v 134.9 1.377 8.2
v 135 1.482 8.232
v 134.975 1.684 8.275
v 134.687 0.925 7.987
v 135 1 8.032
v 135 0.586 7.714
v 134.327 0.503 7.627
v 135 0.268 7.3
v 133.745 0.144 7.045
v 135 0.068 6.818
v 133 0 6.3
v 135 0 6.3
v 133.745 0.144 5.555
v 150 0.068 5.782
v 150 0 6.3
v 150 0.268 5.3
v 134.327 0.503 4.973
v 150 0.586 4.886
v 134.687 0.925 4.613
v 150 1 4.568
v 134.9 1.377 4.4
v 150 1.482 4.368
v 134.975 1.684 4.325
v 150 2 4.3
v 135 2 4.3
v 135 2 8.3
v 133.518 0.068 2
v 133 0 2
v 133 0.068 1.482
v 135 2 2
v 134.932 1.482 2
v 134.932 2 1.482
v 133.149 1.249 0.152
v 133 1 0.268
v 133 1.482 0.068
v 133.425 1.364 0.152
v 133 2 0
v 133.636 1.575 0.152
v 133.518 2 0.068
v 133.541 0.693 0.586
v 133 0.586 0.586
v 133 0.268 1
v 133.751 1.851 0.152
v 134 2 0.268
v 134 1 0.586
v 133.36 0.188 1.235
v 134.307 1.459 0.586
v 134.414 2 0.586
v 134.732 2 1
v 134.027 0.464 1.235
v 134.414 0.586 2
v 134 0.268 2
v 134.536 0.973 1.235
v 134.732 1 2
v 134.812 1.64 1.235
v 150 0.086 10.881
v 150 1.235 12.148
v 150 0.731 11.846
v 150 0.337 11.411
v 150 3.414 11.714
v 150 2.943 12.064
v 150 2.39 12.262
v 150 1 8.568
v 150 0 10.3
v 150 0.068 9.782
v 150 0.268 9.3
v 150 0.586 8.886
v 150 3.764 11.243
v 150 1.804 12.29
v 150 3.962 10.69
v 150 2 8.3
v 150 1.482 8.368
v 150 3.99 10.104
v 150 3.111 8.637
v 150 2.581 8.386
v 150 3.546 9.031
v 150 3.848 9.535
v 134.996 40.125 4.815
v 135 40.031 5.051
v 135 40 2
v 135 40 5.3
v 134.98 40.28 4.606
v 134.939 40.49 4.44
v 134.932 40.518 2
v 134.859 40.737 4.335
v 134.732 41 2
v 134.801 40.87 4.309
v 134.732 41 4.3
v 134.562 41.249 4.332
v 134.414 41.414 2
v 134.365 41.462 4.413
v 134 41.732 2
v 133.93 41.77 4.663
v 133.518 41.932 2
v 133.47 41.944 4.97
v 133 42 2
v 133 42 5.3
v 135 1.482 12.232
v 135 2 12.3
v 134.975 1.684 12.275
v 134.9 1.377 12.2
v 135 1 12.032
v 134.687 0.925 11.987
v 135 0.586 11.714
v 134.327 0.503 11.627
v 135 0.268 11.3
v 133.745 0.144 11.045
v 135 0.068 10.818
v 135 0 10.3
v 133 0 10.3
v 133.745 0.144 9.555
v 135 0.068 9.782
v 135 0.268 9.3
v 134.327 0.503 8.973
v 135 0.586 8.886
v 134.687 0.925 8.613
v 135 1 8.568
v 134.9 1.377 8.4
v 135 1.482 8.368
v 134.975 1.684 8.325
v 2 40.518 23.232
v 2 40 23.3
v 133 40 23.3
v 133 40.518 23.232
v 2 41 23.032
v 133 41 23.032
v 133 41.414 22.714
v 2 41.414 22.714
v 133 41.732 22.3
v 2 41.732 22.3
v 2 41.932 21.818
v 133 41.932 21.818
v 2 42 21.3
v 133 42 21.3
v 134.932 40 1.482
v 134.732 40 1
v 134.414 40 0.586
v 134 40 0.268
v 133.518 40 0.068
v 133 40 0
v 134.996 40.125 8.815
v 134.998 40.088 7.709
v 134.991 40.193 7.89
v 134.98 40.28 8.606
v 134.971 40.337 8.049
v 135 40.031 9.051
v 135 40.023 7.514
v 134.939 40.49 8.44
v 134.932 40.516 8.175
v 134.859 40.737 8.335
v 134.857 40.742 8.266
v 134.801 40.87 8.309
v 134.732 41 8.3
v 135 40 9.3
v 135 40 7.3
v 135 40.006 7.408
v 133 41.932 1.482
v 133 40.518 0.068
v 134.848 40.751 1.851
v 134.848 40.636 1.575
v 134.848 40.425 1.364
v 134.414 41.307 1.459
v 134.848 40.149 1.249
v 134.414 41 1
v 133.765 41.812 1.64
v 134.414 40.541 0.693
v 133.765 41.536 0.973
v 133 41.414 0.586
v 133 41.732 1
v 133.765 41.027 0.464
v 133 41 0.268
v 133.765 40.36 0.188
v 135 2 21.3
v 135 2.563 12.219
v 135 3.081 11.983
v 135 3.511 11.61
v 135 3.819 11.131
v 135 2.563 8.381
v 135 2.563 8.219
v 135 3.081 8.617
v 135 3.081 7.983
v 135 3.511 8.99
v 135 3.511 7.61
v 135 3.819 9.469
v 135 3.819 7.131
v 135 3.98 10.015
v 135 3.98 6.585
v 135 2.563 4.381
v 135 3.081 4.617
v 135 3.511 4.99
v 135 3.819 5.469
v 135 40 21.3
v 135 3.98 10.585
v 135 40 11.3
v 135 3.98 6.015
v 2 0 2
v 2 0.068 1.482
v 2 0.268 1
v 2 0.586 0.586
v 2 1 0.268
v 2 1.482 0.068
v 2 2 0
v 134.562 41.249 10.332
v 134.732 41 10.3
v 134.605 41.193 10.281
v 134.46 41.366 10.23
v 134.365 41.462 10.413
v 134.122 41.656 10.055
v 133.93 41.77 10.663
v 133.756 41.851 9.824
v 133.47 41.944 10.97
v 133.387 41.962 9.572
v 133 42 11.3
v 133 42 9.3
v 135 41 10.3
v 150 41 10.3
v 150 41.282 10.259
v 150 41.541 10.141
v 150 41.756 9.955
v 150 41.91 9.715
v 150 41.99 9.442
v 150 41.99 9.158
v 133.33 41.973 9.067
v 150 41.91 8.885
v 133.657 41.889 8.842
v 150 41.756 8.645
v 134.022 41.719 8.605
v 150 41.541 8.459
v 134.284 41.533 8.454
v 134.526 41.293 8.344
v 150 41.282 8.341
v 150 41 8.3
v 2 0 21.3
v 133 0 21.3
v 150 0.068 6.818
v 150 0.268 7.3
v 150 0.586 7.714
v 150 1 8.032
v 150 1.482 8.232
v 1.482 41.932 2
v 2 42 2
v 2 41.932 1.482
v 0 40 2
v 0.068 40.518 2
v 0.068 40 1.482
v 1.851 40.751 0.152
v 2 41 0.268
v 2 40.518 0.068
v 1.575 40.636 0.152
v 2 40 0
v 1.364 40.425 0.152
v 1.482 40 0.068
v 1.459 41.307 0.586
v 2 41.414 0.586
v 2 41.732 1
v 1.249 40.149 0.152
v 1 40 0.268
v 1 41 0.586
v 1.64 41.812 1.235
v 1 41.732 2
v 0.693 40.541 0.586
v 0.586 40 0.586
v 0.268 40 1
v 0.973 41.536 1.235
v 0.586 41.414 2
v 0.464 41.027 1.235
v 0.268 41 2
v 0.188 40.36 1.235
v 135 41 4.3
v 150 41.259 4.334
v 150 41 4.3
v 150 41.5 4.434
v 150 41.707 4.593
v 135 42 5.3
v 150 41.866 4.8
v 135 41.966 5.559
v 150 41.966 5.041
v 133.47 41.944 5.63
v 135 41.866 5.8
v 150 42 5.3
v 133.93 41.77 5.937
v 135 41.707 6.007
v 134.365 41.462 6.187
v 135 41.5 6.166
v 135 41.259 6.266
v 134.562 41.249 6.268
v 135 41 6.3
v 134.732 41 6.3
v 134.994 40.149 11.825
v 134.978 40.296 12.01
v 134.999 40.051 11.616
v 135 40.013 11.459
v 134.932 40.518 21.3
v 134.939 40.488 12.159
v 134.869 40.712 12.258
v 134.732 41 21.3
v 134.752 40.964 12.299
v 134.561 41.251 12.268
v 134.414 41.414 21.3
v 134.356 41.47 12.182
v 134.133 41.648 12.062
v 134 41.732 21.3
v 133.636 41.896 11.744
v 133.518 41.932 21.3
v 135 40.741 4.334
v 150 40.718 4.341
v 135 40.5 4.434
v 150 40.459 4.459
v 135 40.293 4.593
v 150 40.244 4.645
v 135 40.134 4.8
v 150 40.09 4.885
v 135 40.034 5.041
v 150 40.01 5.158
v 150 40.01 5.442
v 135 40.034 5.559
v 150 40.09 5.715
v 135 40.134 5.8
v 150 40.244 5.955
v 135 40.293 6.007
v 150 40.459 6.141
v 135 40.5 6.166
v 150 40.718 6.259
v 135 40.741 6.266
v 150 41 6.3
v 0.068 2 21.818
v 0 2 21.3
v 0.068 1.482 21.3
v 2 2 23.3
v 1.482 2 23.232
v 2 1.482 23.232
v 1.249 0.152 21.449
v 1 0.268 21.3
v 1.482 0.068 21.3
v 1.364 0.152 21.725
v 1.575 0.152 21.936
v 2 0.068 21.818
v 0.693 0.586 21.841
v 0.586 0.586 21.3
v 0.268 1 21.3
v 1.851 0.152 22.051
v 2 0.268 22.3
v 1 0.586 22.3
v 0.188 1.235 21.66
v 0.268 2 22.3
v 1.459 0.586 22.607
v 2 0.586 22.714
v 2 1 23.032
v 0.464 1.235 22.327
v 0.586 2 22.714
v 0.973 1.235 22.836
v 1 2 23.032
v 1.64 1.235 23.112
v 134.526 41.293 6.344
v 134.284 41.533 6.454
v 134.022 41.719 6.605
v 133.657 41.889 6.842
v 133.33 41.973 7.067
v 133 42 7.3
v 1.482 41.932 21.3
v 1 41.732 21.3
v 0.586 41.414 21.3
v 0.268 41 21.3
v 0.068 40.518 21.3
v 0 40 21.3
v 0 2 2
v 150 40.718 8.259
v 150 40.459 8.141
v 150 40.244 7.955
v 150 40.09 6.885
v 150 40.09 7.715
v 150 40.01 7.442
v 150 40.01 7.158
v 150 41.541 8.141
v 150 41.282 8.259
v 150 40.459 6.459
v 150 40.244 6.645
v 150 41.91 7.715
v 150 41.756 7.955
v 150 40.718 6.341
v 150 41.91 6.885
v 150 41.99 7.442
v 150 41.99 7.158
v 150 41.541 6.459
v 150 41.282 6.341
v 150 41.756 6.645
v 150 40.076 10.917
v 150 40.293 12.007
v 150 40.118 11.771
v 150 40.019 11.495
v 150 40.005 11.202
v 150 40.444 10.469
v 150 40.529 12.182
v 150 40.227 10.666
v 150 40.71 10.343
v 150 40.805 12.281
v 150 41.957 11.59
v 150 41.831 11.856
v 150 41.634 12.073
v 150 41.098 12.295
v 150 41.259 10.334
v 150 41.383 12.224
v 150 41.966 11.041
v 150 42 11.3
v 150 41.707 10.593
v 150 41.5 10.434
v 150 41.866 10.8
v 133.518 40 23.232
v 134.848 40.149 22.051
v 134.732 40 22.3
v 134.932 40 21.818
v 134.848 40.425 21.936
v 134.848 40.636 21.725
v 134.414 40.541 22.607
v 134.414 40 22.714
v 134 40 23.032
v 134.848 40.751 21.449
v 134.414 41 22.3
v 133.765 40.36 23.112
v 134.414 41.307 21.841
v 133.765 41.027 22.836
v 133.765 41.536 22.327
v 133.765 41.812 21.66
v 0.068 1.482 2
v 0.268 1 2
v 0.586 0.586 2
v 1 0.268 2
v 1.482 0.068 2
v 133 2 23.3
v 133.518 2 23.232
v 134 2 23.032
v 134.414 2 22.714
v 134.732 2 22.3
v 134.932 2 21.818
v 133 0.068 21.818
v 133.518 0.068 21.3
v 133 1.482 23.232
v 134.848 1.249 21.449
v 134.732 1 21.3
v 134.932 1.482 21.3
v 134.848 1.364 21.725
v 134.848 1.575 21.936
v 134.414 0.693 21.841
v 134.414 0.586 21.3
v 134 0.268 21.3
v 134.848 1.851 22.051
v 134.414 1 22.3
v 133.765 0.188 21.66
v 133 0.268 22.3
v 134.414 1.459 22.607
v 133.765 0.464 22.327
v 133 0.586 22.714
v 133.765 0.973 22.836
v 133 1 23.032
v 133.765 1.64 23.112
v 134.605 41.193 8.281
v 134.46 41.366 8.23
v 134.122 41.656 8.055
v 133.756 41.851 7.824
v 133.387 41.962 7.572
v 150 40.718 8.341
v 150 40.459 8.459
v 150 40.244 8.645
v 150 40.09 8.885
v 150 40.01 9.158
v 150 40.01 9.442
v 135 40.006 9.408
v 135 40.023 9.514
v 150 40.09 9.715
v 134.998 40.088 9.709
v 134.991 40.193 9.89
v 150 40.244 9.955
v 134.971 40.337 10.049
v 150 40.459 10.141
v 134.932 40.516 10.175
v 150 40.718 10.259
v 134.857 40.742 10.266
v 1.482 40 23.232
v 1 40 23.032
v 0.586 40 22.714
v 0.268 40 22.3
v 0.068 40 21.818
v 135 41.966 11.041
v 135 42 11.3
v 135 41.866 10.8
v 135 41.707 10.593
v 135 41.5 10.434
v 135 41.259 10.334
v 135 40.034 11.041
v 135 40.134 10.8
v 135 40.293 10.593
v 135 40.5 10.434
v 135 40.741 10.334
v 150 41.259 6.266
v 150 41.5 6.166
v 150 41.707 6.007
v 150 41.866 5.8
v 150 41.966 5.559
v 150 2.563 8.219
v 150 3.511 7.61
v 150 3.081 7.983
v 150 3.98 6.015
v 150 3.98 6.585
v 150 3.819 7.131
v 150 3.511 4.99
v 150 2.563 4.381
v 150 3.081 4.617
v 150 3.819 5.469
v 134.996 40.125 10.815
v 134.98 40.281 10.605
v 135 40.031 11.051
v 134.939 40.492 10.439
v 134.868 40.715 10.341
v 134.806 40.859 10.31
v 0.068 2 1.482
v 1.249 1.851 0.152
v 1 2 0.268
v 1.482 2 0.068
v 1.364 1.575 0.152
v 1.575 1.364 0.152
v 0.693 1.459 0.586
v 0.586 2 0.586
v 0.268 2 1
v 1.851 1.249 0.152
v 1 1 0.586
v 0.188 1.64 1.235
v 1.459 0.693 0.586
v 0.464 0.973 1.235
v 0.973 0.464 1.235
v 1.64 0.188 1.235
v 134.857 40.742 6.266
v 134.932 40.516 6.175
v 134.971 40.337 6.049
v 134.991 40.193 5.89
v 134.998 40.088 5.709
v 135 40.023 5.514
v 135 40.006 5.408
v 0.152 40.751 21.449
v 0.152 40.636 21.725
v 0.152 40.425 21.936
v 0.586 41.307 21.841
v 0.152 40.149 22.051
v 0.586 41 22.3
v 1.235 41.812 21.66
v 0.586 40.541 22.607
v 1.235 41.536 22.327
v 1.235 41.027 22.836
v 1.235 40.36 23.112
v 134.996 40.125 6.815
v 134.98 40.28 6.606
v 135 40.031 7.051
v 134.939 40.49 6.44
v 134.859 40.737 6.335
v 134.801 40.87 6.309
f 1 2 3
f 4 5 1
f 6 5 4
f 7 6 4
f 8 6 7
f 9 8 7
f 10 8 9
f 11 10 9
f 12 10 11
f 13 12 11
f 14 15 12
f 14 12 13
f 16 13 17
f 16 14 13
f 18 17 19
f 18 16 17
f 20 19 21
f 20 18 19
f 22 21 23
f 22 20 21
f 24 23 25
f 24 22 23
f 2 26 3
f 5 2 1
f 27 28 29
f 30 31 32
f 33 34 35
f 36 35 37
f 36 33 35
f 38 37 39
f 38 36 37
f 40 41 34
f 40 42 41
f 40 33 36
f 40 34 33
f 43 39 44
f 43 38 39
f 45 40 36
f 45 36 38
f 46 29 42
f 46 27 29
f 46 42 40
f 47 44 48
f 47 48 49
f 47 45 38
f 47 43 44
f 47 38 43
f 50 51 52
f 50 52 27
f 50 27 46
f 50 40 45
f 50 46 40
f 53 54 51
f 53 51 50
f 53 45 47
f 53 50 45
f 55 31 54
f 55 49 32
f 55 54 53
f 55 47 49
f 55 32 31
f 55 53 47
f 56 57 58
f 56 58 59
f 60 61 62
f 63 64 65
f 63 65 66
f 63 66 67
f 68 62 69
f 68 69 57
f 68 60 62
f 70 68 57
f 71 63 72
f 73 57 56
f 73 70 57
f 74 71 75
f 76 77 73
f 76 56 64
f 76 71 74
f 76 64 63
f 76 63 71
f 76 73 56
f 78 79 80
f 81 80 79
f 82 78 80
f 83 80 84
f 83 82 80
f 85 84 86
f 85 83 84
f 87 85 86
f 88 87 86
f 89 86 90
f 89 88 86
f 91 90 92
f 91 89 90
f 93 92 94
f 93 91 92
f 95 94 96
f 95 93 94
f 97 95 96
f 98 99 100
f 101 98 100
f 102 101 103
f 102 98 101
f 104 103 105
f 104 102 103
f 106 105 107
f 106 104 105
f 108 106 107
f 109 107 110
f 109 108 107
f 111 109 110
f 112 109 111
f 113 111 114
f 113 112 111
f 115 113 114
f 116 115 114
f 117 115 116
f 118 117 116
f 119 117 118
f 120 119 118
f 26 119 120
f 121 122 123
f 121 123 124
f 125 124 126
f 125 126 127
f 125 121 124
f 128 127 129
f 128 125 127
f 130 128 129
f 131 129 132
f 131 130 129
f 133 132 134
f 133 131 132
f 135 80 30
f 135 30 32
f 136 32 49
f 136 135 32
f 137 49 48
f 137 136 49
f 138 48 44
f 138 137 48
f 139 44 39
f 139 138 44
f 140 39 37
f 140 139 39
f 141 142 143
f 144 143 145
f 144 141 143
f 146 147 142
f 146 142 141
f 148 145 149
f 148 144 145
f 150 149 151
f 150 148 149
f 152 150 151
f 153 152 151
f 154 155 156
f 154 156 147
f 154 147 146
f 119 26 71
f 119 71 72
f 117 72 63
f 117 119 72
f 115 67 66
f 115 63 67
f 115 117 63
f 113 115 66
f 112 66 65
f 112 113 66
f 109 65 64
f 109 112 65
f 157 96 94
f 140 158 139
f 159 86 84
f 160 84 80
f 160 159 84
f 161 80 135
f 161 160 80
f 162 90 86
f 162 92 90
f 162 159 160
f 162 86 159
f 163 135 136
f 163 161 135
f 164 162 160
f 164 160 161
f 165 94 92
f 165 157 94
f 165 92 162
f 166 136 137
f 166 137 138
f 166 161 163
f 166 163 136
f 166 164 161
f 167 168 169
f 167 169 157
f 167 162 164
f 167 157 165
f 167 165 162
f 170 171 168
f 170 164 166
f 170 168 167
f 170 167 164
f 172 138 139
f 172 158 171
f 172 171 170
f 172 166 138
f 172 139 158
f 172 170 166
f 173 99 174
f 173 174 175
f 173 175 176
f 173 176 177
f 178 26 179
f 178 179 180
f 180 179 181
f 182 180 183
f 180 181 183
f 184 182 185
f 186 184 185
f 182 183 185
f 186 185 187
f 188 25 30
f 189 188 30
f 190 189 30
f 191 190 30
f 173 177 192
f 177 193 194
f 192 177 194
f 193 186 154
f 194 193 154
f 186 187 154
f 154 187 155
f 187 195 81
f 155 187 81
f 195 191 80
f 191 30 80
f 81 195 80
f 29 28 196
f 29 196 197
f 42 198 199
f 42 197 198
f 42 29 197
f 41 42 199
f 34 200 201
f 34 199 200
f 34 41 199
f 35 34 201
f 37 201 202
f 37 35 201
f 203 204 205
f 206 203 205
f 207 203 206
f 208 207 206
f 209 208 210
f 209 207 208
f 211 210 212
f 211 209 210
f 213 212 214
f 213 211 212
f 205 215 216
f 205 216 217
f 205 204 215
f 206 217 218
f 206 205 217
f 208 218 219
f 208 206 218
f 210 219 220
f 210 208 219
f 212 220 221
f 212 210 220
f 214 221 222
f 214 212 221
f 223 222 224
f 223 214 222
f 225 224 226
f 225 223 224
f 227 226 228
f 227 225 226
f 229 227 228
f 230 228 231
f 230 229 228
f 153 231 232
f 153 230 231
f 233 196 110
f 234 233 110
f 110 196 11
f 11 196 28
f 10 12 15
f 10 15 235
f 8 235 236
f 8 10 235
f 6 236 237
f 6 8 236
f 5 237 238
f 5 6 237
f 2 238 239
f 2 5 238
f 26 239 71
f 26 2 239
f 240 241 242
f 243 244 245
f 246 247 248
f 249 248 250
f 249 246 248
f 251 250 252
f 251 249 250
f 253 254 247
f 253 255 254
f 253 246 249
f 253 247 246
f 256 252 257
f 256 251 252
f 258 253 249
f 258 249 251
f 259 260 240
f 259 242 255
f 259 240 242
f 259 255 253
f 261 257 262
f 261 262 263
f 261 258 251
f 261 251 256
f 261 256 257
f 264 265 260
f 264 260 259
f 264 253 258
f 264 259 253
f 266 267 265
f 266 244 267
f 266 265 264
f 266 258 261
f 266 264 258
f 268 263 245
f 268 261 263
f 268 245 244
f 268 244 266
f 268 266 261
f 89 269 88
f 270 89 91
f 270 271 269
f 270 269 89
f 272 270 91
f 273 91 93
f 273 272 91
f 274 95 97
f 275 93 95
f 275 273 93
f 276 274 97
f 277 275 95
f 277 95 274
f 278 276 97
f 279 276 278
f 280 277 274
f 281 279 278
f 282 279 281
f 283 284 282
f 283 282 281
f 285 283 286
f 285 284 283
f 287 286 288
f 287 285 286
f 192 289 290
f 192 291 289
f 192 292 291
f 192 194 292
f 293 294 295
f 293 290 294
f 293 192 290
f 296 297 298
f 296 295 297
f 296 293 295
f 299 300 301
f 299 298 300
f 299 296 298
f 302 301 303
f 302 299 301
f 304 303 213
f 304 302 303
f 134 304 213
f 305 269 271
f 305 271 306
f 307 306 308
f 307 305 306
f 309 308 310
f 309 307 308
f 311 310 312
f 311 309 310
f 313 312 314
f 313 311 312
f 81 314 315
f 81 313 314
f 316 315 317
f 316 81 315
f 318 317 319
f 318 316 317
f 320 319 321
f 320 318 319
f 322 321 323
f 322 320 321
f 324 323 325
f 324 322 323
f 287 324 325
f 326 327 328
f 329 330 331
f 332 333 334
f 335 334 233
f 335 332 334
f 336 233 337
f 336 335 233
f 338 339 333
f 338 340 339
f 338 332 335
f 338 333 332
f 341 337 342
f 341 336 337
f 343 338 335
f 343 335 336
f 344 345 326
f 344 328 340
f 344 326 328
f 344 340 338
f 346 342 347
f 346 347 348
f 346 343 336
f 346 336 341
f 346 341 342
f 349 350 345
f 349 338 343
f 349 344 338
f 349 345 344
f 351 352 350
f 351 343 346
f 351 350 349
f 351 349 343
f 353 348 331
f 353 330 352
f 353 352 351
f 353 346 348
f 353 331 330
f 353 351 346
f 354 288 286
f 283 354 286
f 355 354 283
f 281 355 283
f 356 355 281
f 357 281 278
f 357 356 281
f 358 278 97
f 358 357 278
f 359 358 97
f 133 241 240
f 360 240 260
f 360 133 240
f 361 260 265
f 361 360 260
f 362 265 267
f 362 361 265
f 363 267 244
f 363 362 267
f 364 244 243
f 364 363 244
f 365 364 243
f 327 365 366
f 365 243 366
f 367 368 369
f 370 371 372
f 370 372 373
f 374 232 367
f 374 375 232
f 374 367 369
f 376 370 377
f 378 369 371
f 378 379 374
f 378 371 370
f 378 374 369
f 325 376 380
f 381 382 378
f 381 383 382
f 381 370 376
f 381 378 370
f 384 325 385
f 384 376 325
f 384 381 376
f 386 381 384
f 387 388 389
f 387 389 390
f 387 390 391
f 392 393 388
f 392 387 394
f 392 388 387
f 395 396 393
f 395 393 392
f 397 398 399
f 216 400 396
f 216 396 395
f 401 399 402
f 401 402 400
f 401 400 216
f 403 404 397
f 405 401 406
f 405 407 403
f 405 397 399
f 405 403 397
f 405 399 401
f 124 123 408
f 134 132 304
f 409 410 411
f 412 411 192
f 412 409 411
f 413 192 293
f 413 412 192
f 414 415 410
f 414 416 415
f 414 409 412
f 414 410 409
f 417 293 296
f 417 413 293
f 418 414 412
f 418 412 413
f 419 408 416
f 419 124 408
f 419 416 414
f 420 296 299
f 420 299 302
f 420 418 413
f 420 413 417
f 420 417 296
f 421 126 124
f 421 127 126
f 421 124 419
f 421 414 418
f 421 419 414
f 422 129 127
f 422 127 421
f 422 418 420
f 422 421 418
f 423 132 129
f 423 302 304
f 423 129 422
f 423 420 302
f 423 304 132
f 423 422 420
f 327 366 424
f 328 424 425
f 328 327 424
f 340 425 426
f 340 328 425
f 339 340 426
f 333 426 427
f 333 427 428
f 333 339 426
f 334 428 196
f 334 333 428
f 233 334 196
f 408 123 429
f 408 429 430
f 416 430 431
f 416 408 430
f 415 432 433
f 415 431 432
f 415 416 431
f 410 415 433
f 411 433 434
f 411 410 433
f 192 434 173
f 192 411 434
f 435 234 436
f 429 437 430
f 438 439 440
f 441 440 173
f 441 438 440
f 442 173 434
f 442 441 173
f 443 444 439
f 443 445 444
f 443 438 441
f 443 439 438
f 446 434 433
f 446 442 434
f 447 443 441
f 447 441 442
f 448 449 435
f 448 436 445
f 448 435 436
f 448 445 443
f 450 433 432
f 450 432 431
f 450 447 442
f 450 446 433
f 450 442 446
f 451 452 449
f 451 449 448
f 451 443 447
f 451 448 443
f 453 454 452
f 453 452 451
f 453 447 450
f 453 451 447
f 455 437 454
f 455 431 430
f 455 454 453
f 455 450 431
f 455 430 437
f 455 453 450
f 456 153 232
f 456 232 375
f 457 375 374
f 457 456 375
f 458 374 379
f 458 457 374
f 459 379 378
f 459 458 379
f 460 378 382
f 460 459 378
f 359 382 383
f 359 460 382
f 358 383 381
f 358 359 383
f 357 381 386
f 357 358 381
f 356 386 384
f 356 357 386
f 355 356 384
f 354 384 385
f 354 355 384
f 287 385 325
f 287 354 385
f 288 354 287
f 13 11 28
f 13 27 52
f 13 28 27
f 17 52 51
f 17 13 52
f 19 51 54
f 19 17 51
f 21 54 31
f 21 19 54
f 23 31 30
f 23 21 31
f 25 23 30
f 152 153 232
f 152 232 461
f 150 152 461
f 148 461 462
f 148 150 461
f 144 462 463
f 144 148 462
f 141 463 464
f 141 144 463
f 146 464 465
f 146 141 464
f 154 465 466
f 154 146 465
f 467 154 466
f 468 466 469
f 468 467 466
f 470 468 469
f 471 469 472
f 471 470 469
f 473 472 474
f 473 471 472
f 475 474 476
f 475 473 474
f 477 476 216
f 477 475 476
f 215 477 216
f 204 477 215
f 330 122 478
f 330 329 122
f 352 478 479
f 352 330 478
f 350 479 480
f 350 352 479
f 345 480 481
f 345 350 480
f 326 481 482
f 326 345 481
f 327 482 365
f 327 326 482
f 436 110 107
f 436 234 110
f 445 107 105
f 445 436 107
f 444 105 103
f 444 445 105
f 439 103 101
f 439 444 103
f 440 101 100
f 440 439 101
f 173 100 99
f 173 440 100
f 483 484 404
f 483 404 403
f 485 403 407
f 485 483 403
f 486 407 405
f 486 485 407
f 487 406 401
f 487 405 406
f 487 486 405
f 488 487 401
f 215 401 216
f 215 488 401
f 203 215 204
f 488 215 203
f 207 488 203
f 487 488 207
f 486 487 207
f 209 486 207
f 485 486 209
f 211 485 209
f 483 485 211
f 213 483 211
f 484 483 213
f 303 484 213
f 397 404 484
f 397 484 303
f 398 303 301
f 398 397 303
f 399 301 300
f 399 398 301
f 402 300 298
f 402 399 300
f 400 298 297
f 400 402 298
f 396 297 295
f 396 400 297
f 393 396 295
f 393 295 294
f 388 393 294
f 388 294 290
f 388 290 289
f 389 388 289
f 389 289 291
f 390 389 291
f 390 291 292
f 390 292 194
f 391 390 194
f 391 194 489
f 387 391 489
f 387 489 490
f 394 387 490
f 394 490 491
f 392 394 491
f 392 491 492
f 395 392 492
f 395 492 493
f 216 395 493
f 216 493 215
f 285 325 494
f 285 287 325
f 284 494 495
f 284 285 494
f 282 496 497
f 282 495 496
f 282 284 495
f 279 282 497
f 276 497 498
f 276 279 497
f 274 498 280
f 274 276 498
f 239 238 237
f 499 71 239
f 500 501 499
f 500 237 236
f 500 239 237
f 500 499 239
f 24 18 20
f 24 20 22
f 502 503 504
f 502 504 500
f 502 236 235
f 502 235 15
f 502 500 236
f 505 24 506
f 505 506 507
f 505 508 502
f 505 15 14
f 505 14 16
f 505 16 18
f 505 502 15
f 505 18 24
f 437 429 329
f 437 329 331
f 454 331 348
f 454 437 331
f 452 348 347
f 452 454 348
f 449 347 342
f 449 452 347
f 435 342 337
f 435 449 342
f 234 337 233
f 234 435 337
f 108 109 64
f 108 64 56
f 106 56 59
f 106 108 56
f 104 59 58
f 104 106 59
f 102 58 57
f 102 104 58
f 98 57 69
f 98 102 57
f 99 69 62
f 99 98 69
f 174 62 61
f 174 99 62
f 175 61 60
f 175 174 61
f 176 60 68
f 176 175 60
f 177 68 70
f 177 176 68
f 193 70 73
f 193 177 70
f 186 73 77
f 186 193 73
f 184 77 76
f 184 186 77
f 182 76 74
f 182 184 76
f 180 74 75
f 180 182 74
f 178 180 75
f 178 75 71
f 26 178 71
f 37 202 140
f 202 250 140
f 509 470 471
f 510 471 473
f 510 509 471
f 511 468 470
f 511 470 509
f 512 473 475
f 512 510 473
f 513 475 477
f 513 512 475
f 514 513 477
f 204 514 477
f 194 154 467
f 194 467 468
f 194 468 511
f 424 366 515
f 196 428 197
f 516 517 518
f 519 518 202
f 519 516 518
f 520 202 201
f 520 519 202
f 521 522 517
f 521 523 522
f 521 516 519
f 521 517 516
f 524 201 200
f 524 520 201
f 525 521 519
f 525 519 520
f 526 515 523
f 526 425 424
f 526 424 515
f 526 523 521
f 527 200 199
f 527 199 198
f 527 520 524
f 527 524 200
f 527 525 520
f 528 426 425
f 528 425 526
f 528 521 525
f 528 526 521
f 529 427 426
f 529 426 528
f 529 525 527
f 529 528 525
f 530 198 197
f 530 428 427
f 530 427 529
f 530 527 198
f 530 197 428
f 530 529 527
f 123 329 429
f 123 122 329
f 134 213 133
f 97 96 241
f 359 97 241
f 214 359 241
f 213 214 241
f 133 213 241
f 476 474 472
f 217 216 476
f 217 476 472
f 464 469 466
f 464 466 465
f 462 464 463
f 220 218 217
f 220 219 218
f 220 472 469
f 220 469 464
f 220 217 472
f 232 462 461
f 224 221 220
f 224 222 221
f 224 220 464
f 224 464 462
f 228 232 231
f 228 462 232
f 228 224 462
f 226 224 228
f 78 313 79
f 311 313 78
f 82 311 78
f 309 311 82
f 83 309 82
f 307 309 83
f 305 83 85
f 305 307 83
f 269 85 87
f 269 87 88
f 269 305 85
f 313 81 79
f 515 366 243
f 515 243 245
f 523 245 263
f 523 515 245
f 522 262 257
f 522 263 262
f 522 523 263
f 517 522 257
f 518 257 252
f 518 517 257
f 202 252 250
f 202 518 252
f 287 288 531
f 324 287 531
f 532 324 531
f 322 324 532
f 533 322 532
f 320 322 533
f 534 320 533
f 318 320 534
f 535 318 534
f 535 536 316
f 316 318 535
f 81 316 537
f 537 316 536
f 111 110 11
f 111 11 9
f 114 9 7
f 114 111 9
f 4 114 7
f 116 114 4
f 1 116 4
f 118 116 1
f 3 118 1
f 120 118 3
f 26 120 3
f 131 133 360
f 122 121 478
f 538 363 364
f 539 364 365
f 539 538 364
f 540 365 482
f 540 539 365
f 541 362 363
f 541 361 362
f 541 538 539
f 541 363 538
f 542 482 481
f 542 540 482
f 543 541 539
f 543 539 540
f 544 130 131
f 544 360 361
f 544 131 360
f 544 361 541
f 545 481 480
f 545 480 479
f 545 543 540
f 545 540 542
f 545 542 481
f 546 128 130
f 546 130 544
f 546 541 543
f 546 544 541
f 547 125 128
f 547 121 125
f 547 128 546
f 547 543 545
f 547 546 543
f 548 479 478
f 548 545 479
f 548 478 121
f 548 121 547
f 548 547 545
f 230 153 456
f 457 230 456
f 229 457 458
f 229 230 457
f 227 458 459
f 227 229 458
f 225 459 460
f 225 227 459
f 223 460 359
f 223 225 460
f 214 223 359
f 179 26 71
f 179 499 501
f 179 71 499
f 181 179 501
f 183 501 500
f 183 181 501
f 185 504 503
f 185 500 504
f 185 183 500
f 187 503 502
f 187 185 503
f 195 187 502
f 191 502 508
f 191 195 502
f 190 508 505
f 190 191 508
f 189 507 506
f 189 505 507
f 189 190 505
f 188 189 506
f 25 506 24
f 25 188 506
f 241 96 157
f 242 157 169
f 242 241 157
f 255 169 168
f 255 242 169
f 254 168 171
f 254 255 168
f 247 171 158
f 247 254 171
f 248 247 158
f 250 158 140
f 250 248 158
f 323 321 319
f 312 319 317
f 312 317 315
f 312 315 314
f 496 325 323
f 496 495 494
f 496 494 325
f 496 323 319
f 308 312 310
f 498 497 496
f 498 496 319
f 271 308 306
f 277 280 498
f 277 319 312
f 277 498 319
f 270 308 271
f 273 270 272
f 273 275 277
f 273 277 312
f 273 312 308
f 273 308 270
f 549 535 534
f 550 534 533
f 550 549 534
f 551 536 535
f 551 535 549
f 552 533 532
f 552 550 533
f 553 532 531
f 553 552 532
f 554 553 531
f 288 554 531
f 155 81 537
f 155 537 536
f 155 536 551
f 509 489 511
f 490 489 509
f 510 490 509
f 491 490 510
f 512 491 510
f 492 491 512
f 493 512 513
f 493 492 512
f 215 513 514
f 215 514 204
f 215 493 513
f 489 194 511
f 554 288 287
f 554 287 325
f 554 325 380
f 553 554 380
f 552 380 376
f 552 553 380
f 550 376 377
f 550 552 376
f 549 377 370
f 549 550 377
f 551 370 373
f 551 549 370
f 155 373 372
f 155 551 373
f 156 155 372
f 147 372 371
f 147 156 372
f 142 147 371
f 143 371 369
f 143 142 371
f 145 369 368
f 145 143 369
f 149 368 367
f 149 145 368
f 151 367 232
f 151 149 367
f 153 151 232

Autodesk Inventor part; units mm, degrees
ref_plane "YZ Plane" through (0, 0, 0) normal (1, 0, 0) x (0, 1, 0)
ref_plane "XZ Plane" through (0, 0, 0) normal (0, 1, 0) x (-1, 0, 0)
ref_plane "XY Plane" through (0, 0, 0) normal (0, 0, 1) x (1, 0, 0)
sketch "Sketch1" plane through (0, 0, 0) normal (0, 0, 1) x (1, 0, 0)
  line L0 (0, 0) -> (135, 0)
  line L1 (135, 0) -> (135, 42)
  line L2 (135, 42) -> (0, 42)
  line L3 (0, 42) -> (0, 0)
  dimension "d0" = 135
  dimension "d1" = 42
extrude "Extrusion1" add sketch "Sketch1" along normal blind 23.3
fillet "Fillet1" radius 2 12 edges at (67.5, 42, 23.3) (0, 42, 11.65) (67.5, 42, 0) (0, 21, 23.3) (67.5, 0, 23.3) (0, 0, 11.65) (0, 21, 0) (135, 21, 23.3) (135, 0, 11.65) (135, 21, 0) (135, 42, 11.65) (67.5, 0, 0)
sketch "Sketch2" plane through (0, 0, 23.3) normal (0, 0, 1) x (1, 0, 0)
  line L0 (112.9507, 4.761) -> (47.847, 4.761) construction
  line L1 (47.847, 4.761) -> (47.847, 21.3737) construction
  line L2 (47.847, 21.3737) -> (112.9507, 21.3737) construction
  line L3 (112.9507, 21.3737) -> (112.9507, 4.761) construction
sketch "Sketch3" plane through (135, 2, 2) normal (1, 0, 0) x (0, 0, -1)
  line L0 (-19.3, -2) -> (0, -2) projected
  line L1 (0, 40) -> (-19.3, 40) projected
  circle A0 centre (-8.3, 0) radius 2
  circle A1 centre (-4.3, 0) radius 2
  circle A2 centre (-9.3, 39) radius 1
  circle A3 centre (-7.3, 39) radius 1
  circle A4 centre (-5.3, 39) radius 1
  circle A5 centre (-3.3, 39) radius 1
  line L2 (-21.3, 38) -> (-21.3, 0) projected
  point P0 (2, -2)
  dimension "d5" = 4
  dimension "d6" = 4
  dimension "d7" = 2
  dimension "d8" = 2
  dimension "d9" = 2
  dimension "d10" = 2
  dimension "d11" = 12
  dimension "d12" = 13
extrude "Extrusion2" add sketch "Sketch3" along normal blind 15 and the other way blind 3 contours A0 | A1 | A5 | A4 | A3 | A2
properties part number "DriveBattery" material "ABS Plastic"
